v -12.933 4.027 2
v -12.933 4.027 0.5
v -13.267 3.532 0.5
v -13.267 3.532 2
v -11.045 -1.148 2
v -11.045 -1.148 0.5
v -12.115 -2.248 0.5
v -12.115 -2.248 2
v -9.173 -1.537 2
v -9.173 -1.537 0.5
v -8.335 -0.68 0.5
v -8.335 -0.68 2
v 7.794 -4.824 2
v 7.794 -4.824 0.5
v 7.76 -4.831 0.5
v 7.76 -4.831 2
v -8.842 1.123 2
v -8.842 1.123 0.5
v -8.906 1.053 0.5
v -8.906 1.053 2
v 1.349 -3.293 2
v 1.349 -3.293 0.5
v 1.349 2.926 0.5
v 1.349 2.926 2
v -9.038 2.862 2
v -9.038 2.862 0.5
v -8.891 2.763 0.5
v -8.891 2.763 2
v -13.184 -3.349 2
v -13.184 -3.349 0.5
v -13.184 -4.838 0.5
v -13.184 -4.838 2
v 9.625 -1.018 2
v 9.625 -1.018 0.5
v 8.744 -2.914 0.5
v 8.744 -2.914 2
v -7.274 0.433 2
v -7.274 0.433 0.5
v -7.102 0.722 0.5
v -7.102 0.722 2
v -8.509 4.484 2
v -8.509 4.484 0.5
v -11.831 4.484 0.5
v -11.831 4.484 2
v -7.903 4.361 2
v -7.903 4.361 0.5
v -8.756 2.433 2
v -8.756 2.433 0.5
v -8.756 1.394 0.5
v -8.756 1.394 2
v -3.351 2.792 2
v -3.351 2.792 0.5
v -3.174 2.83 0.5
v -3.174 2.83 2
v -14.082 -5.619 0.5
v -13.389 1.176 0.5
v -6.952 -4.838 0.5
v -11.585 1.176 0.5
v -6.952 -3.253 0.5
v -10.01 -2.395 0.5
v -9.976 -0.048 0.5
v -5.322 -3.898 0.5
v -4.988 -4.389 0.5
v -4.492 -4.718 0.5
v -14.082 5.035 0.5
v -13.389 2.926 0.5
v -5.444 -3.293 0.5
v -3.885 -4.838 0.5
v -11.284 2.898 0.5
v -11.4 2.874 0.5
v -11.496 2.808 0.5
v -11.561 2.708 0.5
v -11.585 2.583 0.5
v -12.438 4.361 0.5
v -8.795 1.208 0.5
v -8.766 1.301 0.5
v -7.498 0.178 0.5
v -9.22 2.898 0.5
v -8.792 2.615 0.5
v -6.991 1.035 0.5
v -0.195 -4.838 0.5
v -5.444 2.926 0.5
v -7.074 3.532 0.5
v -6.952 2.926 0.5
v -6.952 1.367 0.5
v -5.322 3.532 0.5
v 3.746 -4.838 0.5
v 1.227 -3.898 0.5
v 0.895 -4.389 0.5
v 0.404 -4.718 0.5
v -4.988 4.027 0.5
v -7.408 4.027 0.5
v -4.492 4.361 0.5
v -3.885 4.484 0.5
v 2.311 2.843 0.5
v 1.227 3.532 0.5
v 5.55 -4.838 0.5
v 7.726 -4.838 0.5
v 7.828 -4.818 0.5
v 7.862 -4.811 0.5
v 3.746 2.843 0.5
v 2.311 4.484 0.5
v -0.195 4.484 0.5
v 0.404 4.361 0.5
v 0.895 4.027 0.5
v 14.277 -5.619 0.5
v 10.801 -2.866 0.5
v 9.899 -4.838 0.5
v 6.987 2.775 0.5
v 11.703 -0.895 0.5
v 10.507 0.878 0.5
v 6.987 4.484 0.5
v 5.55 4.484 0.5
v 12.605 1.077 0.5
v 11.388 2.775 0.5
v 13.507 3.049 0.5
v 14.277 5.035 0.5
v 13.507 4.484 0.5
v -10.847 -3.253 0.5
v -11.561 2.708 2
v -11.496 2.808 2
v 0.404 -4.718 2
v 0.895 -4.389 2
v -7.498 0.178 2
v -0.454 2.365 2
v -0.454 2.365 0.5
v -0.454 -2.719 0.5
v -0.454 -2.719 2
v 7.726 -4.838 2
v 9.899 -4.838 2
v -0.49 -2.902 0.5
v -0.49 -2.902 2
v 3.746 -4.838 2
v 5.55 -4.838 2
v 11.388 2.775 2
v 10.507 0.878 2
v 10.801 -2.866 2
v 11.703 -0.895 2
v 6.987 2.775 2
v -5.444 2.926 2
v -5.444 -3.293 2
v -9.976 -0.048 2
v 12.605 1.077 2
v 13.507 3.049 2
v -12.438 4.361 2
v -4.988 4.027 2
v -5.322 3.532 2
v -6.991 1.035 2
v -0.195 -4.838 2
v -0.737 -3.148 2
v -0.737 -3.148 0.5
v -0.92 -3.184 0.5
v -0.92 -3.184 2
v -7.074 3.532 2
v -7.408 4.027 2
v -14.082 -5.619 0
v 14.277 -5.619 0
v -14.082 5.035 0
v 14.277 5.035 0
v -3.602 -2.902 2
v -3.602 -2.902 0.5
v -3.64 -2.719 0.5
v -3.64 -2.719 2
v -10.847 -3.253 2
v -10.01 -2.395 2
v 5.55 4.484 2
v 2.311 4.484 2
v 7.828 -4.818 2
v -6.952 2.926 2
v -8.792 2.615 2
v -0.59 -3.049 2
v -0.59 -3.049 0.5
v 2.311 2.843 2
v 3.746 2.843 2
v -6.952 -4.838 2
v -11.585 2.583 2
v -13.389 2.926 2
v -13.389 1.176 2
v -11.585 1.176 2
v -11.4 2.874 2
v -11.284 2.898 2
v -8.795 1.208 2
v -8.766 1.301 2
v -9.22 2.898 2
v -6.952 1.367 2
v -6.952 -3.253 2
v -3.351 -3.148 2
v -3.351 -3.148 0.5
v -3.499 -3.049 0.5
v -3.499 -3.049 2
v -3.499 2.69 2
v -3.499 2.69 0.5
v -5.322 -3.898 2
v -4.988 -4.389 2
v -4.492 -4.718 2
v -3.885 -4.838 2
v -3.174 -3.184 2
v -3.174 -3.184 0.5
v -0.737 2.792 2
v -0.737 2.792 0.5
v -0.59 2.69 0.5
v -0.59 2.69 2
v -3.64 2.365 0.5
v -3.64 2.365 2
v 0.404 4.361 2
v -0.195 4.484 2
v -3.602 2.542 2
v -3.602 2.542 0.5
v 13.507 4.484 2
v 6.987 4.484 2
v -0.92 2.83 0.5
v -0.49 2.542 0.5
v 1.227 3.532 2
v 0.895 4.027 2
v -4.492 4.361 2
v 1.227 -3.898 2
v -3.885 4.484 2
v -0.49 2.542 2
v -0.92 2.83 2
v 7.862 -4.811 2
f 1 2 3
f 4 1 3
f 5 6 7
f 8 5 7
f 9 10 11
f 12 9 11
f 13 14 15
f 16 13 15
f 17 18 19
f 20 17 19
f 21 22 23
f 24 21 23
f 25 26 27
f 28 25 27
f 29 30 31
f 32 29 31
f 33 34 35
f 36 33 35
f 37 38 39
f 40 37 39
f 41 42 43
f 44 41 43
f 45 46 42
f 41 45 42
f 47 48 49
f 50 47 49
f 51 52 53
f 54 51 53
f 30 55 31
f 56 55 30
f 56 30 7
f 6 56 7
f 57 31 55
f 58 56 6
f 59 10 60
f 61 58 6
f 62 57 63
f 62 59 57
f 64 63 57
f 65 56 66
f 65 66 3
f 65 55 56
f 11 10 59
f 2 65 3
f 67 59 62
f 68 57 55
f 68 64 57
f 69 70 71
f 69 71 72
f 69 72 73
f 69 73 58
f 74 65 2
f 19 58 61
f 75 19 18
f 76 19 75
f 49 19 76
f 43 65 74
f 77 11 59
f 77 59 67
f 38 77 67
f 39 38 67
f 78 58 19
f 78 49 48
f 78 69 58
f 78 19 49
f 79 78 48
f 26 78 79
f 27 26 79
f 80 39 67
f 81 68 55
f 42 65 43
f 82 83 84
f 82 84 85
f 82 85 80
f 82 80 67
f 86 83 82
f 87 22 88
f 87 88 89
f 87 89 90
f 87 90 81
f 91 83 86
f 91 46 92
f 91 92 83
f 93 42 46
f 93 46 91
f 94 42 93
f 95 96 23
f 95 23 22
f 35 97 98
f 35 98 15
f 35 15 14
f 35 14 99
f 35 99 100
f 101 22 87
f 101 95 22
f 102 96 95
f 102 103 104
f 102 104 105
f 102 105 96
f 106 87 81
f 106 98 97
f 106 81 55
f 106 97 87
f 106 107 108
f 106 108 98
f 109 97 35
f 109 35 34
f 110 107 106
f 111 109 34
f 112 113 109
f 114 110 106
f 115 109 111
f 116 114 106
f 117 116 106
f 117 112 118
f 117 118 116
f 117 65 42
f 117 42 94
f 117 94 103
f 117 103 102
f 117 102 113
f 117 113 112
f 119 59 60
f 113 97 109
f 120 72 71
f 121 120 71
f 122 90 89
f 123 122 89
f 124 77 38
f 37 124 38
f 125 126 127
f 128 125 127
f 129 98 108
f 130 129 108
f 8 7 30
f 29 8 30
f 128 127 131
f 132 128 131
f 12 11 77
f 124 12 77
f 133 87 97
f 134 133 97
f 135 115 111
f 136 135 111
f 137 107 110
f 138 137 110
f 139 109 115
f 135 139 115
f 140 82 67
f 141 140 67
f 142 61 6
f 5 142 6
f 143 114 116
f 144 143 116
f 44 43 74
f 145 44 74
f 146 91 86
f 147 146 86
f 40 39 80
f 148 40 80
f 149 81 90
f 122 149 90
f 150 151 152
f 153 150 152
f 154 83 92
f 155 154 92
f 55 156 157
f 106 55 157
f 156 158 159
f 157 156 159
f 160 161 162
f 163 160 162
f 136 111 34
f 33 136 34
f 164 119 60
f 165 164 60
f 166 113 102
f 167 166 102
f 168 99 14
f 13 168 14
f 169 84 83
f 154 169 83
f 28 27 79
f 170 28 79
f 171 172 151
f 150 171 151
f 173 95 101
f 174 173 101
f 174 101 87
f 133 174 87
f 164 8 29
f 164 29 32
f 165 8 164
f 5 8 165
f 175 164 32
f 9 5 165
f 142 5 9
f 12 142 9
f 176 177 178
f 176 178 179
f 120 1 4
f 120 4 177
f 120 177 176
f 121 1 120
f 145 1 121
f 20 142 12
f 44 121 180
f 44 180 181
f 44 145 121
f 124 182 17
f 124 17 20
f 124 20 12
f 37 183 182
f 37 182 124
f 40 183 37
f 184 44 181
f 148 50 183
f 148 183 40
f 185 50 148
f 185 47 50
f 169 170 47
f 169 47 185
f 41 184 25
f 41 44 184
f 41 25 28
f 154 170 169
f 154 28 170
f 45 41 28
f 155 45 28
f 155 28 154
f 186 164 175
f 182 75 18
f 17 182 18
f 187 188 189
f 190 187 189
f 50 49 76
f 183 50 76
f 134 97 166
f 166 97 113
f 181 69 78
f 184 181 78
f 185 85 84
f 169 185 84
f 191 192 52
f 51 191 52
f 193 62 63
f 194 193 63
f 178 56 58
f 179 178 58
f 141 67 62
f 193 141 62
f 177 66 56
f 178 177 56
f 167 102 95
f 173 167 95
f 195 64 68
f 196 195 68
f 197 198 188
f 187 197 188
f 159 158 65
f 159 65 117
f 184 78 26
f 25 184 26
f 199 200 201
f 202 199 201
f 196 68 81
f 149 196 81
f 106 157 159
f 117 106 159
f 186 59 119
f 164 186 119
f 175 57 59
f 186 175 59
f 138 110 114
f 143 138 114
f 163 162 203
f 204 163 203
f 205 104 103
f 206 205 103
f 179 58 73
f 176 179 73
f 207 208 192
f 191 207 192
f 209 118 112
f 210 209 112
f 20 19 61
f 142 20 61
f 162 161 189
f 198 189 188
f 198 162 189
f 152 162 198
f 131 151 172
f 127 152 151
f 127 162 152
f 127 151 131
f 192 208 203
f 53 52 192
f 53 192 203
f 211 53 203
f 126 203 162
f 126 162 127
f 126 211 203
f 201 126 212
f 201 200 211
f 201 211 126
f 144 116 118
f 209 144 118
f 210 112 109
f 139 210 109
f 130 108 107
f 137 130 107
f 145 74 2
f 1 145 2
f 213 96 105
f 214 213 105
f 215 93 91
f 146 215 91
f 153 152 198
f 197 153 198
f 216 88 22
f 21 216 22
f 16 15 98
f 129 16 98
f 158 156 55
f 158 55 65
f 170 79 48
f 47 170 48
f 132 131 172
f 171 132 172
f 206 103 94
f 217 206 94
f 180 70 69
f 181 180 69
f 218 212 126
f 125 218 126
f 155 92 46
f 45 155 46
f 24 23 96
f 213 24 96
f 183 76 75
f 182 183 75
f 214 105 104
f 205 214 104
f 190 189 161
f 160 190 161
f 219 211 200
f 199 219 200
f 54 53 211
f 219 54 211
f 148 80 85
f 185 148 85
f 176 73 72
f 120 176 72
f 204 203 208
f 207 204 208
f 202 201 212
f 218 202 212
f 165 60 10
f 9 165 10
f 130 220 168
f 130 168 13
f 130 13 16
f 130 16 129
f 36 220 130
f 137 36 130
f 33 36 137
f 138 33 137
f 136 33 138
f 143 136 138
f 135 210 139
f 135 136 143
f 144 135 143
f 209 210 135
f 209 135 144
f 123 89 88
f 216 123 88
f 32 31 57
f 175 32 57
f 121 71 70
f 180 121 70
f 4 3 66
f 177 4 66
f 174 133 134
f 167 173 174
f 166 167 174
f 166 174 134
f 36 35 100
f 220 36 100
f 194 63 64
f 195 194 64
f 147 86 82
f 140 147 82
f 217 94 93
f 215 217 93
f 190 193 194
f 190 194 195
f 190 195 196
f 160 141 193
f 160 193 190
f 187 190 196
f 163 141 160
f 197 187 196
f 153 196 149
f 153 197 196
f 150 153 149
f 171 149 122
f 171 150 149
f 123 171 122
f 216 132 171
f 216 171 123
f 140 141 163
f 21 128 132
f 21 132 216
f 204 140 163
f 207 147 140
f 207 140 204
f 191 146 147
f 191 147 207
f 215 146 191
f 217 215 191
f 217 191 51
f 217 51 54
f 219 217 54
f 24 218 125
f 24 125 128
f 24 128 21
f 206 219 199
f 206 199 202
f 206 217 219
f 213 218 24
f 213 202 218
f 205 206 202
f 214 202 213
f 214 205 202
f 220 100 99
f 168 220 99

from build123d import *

# Parameters (mm, degrees)
F0_W     = 28.358727
F0_H     = 10.653684
F1_DEPTH = 0.5
F2_DEPTH = 2


with BuildPart() as f1:
    # F0 (on Top) → F1 (new body)
    with BuildSketch(Plane.XY):
        with Locations((0.097342, -0.292027)):
            Rectangle(F0_W, F0_H)
        Polygon((-12.437687, 4.361372), (-11.831026, 4.483848), (-11.000611, 4.483848), (-10.170197, 4.483848), (-9.339782, 4.483848), (-8.509368, 4.483848), (-7.902696, 4.361372), (-7.407652, 4.027382), (-7.073832, 3.532167), (-6.951535, 2.925676), (-6.951535, 2.536048), (-6.951535, 2.14642), (-6.951535, 1.756791), (-6.951535, 1.367163), (-6.990814, 1.035404), (-7.101741, 0.721563), (-7.274166, 0.433052), (-7.497909, 0.17795), (-8.335223, -0.679854), (-9.172527, -1.537487), (-10.009832, -2.395121), (-10.847136, -3.252925), (-9.873236, -3.252925), (-8.899336, -3.252925), (-7.925436, -3.252925), (-6.951535, -3.252925), (-6.951535, -3.649093), (-6.951535, -4.045441), (-6.951535, -4.441788), (-6.951535, -4.837956), (-8.509708, -4.837956), (-10.06788, -4.837956), (-11.626052, -4.837956), (-13.184214, -4.837956), (-13.184214, -4.465558), (-13.184214, -4.093329), (-13.184214, -3.72109), (-13.184214, -3.348692), (-12.114717, -2.248356), (-11.04522, -1.148029), (-9.975723, -0.047703), (-8.906226, 1.052633), (-8.842317, 1.123421), (-8.795299, 1.208348), (-8.76602, 1.300675), (-8.75602, 1.394373), (-8.75602, 1.654125), (-8.75602, 1.913707), (-8.75602, 2.173289), (-8.75602, 2.433041), (-8.792199, 2.615455), (-8.890896, 2.762901), (-9.038341, 2.861768), (-9.220406, 2.897766), (-9.73647, 2.897766), (-10.252354, 2.897766), (-10.768248, 2.897766), (-11.284303, 2.897766), (-11.400399, 2.873657), (-11.495996, 2.807509), (-11.561114, 2.707602), (-11.585053, 2.583236), (-11.585053, 2.231507), (-11.585053, 1.879778), (-11.585053, 1.528038), (-11.585053, 1.176309), (-12.036, 1.176309), (-12.486956, 1.176309), (-12.937902, 1.176309), (-13.388848, 1.176309), (-13.388848, 1.613646), (-13.388848, 2.050992), (-13.388848, 2.488329), (-13.388848, 2.925676), (-13.266552, 3.532167), (-12.932732, 4.027382), align=None, mode=Mode.SUBTRACT)
        Polygon((-4.492161, 4.361372), (-3.88515, 4.483848), (-2.962578, 4.483848), (-2.040186, 4.483848), (-1.117784, 4.483848), (-0.195223, 4.483848), (0.403689, 4.361372), (0.894774, 4.027382), (1.227044, 3.532167), (1.34917, 2.925676), (1.34917, 1.370953), (1.34917, -0.183779), (1.34917, -1.738501), (1.34917, -3.293224), (1.227044, -3.898165), (0.894774, -4.38873), (0.403689, -4.71773), (-0.195223, -4.837956), (-1.117784, -4.837956), (-2.040186, -4.837956), (-2.962578, -4.837956), (-3.88515, -4.837956), (-4.492161, -4.71773), (-4.987716, -4.38873), (-5.321535, -3.898165), (-5.444012, -3.293224), (-5.444012, -1.738501), (-5.444012, -0.183779), (-5.444012, 1.370953), (-5.444012, 2.925676), (-5.321535, 3.532167), (-4.987716, 4.027382), align=None, mode=Mode.SUBTRACT)
        Polygon((2.31067, 4.07372), (2.31067, 4.483848), (3.120586, 4.483848), (3.930501, 4.483848), (4.740416, 4.483848), (5.550341, 4.483848), (5.550341, 2.153309), (5.550341, -0.177059), (5.550341, -2.507428), (5.550341, -4.837956), (5.099215, -4.837956), (4.648099, -4.837956), (4.196973, -4.837956), (3.745856, -4.837956), (3.745856, -2.917725), (3.745856, -0.997314), (3.745856, 0.923097), (3.745856, 2.843338), (3.387057, 2.843338), (3.028258, 2.843338), (2.669459, 2.843338), (2.31067, 2.843338), (2.31067, 3.253466), (2.31067, 3.663593), align=None, mode=Mode.SUBTRACT)
        Polygon((6.986897, 4.056661), (6.986897, 4.483848), (8.616897, 4.483848), (10.246897, 4.483848), (11.876897, 4.483848), (13.506897, 4.483848), (13.506897, 4.125049), (13.506897, 3.76625), (13.506897, 3.407451), (13.506897, 3.048662), (12.604825, 1.077092), (11.702752, -0.894647), (10.80068, -2.866397), (9.898608, -4.837956), (9.355334, -4.837956), (8.812061, -4.837956), (8.268778, -4.837956), (7.725504, -4.837956), (7.759613, -4.831066), (7.793722, -4.824357), (7.827821, -4.817637), (7.86193, -4.810747), (8.743503, -2.914275), (9.625076, -1.017983), (10.506649, 0.878318), (11.388222, 2.77478), (10.287896, 2.77478), (9.187559, 2.77478), (8.087233, 2.77478), (6.986897, 2.77478), (6.986897, 3.201957), (6.986897, 3.629314), align=None, mode=Mode.SUBTRACT)
        Polygon((-3.639527, -1.44809), (-3.639527, -2.719291), (-3.601628, -2.901706), (-3.499481, -3.049151), (-3.351176, -3.148018), (-3.174451, -3.184017), (-2.610849, -3.184017), (-2.047246, -3.184017), (-1.483643, -3.184017), (-0.920051, -3.184017), (-0.737466, -3.148018), (-0.589671, -3.049151), (-0.490454, -2.901706), (-0.454285, -2.719291), (-0.454285, -1.44809), (-0.454285, -0.177059), (-0.454285, 1.093972), (-0.454285, 2.365173), (-0.490454, 2.541557), (-0.589671, 2.689693), (-0.737466, 2.79184), (-0.920051, 2.829899), (-1.483643, 2.829899), (-2.047246, 2.829899), (-2.610849, 2.829899), (-3.174451, 2.829899), (-3.351176, 2.79184), (-3.499481, 2.689693), (-3.601628, 2.541557), (-3.639527, 2.365173), (-3.639527, 1.093972), (-3.639527, -0.177059), align=None)
    extrude(amount=F1_DEPTH)

    # F0 (on Top) → F2 (join)
    with BuildSketch(Plane.XY):
        Polygon((-11.000611, 4.483848), (-11.831026, 4.483848), (-12.437687, 4.361372), (-12.932732, 4.027382), (-13.266552, 3.532167), (-13.388848, 2.925676), (-13.388848, 2.488329), (-13.388848, 2.050992), (-13.388848, 1.613646), (-13.388848, 1.176309), (-12.937902, 1.176309), (-12.486956, 1.176309), (-12.036, 1.176309), (-11.585053, 1.176309), (-11.585053, 1.528038), (-11.585053, 1.879778), (-11.585053, 2.231507), (-11.585053, 2.583236), (-11.561114, 2.707602), (-11.495996, 2.807509), (-11.400399, 2.873657), (-11.284303, 2.897766), (-10.768248, 2.897766), (-10.252354, 2.897766), (-9.73647, 2.897766), (-9.220406, 2.897766), (-9.038341, 2.861768), (-8.890896, 2.762901), (-8.792199, 2.615455), (-8.75602, 2.433041), (-8.75602, 2.173289), (-8.75602, 1.913707), (-8.75602, 1.654125), (-8.75602, 1.394373), (-8.76602, 1.300675), (-8.795299, 1.208348), (-8.842317, 1.123421), (-8.906226, 1.052633), (-9.975723, -0.047703), (-11.04522, -1.148029), (-12.114717, -2.248356), (-13.184214, -3.348692), (-13.184214, -3.72109), (-13.184214, -4.093329), (-13.184214, -4.465558), (-13.184214, -4.837956), (-11.626052, -4.837956), (-10.06788, -4.837956), (-8.509708, -4.837956), (-6.951535, -4.837956), (-6.951535, -4.441788), (-6.951535, -4.045441), (-6.951535, -3.649093), (-6.951535, -3.252925), (-7.925436, -3.252925), (-8.899336, -3.252925), (-9.873236, -3.252925), (-10.847136, -3.252925), (-10.009832, -2.395121), (-9.172527, -1.537487), (-8.335223, -0.679854), (-7.497909, 0.17795), (-7.274166, 0.433052), (-7.101741, 0.721563), (-6.990814, 1.035404), (-6.951535, 1.367163), (-6.951535, 1.756791), (-6.951535, 2.14642), (-6.951535, 2.536048), (-6.951535, 2.925676), (-7.073832, 3.532167), (-7.407652, 4.027382), (-7.902696, 4.361372), (-8.509368, 4.483848), (-9.339782, 4.483848), (-10.170197, 4.483848), align=None)
        Polygon((-2.962578, 4.483848), (-3.88515, 4.483848), (-4.492161, 4.361372), (-4.987716, 4.027382), (-5.321535, 3.532167), (-5.444012, 2.925676), (-5.444012, 1.370953), (-5.444012, -0.183779), (-5.444012, -1.738501), (-5.444012, -3.293224), (-5.321535, -3.898165), (-4.987716, -4.38873), (-4.492161, -4.71773), (-3.88515, -4.837956), (-2.962578, -4.837956), (-2.040186, -4.837956), (-1.117784, -4.837956), (-0.195223, -4.837956), (0.403689, -4.71773), (0.894774, -4.38873), (1.227044, -3.898165), (1.34917, -3.293224), (1.34917, -1.738501), (1.34917, -0.183779), (1.34917, 1.370953), (1.34917, 2.925676), (1.227044, 3.532167), (0.894774, 4.027382), (0.403689, 4.361372), (-0.195223, 4.483848), (-1.117784, 4.483848), (-2.040186, 4.483848), align=None)
        Polygon((-3.601628, -2.901706), (-3.639527, -2.719291), (-3.639527, -1.44809), (-3.639527, -0.177059), (-3.639527, 1.093972), (-3.639527, 2.365173), (-3.601628, 2.541557), (-3.499481, 2.689693), (-3.351176, 2.79184), (-3.174451, 2.829899), (-2.610849, 2.829899), (-2.047246, 2.829899), (-1.483643, 2.829899), (-0.920051, 2.829899), (-0.737466, 2.79184), (-0.589671, 2.689693), (-0.490454, 2.541557), (-0.454285, 2.365173), (-0.454285, 1.093972), (-0.454285, -0.177059), (-0.454285, -1.44809), (-0.454285, -2.719291), (-0.490454, -2.901706), (-0.589671, -3.049151), (-0.737466, -3.148018), (-0.920051, -3.184017), (-1.483643, -3.184017), (-2.047246, -3.184017), (-2.610849, -3.184017), (-3.174451, -3.184017), (-3.351176, -3.148018), (-3.499481, -3.049151), align=None, mode=Mode.SUBTRACT)
        Polygon((3.120586, 4.483848), (2.31067, 4.483848), (2.31067, 4.07372), (2.31067, 3.663593), (2.31067, 3.253466), (2.31067, 2.843338), (2.669459, 2.843338), (3.028258, 2.843338), (3.387057, 2.843338), (3.745856, 2.843338), (3.745856, 0.923097), (3.745856, -0.997314), (3.745856, -2.917725), (3.745856, -4.837956), (4.196973, -4.837956), (4.648099, -4.837956), (5.099215, -4.837956), (5.550341, -4.837956), (5.550341, -2.507428), (5.550341, -0.177059), (5.550341, 2.153309), (5.550341, 4.483848), (4.740416, 4.483848), (3.930501, 4.483848), align=None)
        Polygon((8.616897, 4.483848), (6.986897, 4.483848), (6.986897, 4.056661), (6.986897, 3.629314), (6.986897, 3.201957), (6.986897, 2.77478), (8.087233, 2.77478), (9.187559, 2.77478), (10.287896, 2.77478), (11.388222, 2.77478), (10.506649, 0.878318), (9.625076, -1.017983), (8.743503, -2.914275), (7.86193, -4.810747), (7.827821, -4.817637), (7.793722, -4.824357), (7.759613, -4.831066), (7.725504, -4.837956), (8.268778, -4.837956), (8.812061, -4.837956), (9.355334, -4.837956), (9.898608, -4.837956), (10.80068, -2.866397), (11.702752, -0.894647), (12.604825, 1.077092), (13.506897, 3.048662), (13.506897, 3.407451), (13.506897, 3.76625), (13.506897, 4.125049), (13.506897, 4.483848), (11.876897, 4.483848), (10.246897, 4.483848), align=None)
    extrude(amount=F2_DEPTH)


solid = f1.part
